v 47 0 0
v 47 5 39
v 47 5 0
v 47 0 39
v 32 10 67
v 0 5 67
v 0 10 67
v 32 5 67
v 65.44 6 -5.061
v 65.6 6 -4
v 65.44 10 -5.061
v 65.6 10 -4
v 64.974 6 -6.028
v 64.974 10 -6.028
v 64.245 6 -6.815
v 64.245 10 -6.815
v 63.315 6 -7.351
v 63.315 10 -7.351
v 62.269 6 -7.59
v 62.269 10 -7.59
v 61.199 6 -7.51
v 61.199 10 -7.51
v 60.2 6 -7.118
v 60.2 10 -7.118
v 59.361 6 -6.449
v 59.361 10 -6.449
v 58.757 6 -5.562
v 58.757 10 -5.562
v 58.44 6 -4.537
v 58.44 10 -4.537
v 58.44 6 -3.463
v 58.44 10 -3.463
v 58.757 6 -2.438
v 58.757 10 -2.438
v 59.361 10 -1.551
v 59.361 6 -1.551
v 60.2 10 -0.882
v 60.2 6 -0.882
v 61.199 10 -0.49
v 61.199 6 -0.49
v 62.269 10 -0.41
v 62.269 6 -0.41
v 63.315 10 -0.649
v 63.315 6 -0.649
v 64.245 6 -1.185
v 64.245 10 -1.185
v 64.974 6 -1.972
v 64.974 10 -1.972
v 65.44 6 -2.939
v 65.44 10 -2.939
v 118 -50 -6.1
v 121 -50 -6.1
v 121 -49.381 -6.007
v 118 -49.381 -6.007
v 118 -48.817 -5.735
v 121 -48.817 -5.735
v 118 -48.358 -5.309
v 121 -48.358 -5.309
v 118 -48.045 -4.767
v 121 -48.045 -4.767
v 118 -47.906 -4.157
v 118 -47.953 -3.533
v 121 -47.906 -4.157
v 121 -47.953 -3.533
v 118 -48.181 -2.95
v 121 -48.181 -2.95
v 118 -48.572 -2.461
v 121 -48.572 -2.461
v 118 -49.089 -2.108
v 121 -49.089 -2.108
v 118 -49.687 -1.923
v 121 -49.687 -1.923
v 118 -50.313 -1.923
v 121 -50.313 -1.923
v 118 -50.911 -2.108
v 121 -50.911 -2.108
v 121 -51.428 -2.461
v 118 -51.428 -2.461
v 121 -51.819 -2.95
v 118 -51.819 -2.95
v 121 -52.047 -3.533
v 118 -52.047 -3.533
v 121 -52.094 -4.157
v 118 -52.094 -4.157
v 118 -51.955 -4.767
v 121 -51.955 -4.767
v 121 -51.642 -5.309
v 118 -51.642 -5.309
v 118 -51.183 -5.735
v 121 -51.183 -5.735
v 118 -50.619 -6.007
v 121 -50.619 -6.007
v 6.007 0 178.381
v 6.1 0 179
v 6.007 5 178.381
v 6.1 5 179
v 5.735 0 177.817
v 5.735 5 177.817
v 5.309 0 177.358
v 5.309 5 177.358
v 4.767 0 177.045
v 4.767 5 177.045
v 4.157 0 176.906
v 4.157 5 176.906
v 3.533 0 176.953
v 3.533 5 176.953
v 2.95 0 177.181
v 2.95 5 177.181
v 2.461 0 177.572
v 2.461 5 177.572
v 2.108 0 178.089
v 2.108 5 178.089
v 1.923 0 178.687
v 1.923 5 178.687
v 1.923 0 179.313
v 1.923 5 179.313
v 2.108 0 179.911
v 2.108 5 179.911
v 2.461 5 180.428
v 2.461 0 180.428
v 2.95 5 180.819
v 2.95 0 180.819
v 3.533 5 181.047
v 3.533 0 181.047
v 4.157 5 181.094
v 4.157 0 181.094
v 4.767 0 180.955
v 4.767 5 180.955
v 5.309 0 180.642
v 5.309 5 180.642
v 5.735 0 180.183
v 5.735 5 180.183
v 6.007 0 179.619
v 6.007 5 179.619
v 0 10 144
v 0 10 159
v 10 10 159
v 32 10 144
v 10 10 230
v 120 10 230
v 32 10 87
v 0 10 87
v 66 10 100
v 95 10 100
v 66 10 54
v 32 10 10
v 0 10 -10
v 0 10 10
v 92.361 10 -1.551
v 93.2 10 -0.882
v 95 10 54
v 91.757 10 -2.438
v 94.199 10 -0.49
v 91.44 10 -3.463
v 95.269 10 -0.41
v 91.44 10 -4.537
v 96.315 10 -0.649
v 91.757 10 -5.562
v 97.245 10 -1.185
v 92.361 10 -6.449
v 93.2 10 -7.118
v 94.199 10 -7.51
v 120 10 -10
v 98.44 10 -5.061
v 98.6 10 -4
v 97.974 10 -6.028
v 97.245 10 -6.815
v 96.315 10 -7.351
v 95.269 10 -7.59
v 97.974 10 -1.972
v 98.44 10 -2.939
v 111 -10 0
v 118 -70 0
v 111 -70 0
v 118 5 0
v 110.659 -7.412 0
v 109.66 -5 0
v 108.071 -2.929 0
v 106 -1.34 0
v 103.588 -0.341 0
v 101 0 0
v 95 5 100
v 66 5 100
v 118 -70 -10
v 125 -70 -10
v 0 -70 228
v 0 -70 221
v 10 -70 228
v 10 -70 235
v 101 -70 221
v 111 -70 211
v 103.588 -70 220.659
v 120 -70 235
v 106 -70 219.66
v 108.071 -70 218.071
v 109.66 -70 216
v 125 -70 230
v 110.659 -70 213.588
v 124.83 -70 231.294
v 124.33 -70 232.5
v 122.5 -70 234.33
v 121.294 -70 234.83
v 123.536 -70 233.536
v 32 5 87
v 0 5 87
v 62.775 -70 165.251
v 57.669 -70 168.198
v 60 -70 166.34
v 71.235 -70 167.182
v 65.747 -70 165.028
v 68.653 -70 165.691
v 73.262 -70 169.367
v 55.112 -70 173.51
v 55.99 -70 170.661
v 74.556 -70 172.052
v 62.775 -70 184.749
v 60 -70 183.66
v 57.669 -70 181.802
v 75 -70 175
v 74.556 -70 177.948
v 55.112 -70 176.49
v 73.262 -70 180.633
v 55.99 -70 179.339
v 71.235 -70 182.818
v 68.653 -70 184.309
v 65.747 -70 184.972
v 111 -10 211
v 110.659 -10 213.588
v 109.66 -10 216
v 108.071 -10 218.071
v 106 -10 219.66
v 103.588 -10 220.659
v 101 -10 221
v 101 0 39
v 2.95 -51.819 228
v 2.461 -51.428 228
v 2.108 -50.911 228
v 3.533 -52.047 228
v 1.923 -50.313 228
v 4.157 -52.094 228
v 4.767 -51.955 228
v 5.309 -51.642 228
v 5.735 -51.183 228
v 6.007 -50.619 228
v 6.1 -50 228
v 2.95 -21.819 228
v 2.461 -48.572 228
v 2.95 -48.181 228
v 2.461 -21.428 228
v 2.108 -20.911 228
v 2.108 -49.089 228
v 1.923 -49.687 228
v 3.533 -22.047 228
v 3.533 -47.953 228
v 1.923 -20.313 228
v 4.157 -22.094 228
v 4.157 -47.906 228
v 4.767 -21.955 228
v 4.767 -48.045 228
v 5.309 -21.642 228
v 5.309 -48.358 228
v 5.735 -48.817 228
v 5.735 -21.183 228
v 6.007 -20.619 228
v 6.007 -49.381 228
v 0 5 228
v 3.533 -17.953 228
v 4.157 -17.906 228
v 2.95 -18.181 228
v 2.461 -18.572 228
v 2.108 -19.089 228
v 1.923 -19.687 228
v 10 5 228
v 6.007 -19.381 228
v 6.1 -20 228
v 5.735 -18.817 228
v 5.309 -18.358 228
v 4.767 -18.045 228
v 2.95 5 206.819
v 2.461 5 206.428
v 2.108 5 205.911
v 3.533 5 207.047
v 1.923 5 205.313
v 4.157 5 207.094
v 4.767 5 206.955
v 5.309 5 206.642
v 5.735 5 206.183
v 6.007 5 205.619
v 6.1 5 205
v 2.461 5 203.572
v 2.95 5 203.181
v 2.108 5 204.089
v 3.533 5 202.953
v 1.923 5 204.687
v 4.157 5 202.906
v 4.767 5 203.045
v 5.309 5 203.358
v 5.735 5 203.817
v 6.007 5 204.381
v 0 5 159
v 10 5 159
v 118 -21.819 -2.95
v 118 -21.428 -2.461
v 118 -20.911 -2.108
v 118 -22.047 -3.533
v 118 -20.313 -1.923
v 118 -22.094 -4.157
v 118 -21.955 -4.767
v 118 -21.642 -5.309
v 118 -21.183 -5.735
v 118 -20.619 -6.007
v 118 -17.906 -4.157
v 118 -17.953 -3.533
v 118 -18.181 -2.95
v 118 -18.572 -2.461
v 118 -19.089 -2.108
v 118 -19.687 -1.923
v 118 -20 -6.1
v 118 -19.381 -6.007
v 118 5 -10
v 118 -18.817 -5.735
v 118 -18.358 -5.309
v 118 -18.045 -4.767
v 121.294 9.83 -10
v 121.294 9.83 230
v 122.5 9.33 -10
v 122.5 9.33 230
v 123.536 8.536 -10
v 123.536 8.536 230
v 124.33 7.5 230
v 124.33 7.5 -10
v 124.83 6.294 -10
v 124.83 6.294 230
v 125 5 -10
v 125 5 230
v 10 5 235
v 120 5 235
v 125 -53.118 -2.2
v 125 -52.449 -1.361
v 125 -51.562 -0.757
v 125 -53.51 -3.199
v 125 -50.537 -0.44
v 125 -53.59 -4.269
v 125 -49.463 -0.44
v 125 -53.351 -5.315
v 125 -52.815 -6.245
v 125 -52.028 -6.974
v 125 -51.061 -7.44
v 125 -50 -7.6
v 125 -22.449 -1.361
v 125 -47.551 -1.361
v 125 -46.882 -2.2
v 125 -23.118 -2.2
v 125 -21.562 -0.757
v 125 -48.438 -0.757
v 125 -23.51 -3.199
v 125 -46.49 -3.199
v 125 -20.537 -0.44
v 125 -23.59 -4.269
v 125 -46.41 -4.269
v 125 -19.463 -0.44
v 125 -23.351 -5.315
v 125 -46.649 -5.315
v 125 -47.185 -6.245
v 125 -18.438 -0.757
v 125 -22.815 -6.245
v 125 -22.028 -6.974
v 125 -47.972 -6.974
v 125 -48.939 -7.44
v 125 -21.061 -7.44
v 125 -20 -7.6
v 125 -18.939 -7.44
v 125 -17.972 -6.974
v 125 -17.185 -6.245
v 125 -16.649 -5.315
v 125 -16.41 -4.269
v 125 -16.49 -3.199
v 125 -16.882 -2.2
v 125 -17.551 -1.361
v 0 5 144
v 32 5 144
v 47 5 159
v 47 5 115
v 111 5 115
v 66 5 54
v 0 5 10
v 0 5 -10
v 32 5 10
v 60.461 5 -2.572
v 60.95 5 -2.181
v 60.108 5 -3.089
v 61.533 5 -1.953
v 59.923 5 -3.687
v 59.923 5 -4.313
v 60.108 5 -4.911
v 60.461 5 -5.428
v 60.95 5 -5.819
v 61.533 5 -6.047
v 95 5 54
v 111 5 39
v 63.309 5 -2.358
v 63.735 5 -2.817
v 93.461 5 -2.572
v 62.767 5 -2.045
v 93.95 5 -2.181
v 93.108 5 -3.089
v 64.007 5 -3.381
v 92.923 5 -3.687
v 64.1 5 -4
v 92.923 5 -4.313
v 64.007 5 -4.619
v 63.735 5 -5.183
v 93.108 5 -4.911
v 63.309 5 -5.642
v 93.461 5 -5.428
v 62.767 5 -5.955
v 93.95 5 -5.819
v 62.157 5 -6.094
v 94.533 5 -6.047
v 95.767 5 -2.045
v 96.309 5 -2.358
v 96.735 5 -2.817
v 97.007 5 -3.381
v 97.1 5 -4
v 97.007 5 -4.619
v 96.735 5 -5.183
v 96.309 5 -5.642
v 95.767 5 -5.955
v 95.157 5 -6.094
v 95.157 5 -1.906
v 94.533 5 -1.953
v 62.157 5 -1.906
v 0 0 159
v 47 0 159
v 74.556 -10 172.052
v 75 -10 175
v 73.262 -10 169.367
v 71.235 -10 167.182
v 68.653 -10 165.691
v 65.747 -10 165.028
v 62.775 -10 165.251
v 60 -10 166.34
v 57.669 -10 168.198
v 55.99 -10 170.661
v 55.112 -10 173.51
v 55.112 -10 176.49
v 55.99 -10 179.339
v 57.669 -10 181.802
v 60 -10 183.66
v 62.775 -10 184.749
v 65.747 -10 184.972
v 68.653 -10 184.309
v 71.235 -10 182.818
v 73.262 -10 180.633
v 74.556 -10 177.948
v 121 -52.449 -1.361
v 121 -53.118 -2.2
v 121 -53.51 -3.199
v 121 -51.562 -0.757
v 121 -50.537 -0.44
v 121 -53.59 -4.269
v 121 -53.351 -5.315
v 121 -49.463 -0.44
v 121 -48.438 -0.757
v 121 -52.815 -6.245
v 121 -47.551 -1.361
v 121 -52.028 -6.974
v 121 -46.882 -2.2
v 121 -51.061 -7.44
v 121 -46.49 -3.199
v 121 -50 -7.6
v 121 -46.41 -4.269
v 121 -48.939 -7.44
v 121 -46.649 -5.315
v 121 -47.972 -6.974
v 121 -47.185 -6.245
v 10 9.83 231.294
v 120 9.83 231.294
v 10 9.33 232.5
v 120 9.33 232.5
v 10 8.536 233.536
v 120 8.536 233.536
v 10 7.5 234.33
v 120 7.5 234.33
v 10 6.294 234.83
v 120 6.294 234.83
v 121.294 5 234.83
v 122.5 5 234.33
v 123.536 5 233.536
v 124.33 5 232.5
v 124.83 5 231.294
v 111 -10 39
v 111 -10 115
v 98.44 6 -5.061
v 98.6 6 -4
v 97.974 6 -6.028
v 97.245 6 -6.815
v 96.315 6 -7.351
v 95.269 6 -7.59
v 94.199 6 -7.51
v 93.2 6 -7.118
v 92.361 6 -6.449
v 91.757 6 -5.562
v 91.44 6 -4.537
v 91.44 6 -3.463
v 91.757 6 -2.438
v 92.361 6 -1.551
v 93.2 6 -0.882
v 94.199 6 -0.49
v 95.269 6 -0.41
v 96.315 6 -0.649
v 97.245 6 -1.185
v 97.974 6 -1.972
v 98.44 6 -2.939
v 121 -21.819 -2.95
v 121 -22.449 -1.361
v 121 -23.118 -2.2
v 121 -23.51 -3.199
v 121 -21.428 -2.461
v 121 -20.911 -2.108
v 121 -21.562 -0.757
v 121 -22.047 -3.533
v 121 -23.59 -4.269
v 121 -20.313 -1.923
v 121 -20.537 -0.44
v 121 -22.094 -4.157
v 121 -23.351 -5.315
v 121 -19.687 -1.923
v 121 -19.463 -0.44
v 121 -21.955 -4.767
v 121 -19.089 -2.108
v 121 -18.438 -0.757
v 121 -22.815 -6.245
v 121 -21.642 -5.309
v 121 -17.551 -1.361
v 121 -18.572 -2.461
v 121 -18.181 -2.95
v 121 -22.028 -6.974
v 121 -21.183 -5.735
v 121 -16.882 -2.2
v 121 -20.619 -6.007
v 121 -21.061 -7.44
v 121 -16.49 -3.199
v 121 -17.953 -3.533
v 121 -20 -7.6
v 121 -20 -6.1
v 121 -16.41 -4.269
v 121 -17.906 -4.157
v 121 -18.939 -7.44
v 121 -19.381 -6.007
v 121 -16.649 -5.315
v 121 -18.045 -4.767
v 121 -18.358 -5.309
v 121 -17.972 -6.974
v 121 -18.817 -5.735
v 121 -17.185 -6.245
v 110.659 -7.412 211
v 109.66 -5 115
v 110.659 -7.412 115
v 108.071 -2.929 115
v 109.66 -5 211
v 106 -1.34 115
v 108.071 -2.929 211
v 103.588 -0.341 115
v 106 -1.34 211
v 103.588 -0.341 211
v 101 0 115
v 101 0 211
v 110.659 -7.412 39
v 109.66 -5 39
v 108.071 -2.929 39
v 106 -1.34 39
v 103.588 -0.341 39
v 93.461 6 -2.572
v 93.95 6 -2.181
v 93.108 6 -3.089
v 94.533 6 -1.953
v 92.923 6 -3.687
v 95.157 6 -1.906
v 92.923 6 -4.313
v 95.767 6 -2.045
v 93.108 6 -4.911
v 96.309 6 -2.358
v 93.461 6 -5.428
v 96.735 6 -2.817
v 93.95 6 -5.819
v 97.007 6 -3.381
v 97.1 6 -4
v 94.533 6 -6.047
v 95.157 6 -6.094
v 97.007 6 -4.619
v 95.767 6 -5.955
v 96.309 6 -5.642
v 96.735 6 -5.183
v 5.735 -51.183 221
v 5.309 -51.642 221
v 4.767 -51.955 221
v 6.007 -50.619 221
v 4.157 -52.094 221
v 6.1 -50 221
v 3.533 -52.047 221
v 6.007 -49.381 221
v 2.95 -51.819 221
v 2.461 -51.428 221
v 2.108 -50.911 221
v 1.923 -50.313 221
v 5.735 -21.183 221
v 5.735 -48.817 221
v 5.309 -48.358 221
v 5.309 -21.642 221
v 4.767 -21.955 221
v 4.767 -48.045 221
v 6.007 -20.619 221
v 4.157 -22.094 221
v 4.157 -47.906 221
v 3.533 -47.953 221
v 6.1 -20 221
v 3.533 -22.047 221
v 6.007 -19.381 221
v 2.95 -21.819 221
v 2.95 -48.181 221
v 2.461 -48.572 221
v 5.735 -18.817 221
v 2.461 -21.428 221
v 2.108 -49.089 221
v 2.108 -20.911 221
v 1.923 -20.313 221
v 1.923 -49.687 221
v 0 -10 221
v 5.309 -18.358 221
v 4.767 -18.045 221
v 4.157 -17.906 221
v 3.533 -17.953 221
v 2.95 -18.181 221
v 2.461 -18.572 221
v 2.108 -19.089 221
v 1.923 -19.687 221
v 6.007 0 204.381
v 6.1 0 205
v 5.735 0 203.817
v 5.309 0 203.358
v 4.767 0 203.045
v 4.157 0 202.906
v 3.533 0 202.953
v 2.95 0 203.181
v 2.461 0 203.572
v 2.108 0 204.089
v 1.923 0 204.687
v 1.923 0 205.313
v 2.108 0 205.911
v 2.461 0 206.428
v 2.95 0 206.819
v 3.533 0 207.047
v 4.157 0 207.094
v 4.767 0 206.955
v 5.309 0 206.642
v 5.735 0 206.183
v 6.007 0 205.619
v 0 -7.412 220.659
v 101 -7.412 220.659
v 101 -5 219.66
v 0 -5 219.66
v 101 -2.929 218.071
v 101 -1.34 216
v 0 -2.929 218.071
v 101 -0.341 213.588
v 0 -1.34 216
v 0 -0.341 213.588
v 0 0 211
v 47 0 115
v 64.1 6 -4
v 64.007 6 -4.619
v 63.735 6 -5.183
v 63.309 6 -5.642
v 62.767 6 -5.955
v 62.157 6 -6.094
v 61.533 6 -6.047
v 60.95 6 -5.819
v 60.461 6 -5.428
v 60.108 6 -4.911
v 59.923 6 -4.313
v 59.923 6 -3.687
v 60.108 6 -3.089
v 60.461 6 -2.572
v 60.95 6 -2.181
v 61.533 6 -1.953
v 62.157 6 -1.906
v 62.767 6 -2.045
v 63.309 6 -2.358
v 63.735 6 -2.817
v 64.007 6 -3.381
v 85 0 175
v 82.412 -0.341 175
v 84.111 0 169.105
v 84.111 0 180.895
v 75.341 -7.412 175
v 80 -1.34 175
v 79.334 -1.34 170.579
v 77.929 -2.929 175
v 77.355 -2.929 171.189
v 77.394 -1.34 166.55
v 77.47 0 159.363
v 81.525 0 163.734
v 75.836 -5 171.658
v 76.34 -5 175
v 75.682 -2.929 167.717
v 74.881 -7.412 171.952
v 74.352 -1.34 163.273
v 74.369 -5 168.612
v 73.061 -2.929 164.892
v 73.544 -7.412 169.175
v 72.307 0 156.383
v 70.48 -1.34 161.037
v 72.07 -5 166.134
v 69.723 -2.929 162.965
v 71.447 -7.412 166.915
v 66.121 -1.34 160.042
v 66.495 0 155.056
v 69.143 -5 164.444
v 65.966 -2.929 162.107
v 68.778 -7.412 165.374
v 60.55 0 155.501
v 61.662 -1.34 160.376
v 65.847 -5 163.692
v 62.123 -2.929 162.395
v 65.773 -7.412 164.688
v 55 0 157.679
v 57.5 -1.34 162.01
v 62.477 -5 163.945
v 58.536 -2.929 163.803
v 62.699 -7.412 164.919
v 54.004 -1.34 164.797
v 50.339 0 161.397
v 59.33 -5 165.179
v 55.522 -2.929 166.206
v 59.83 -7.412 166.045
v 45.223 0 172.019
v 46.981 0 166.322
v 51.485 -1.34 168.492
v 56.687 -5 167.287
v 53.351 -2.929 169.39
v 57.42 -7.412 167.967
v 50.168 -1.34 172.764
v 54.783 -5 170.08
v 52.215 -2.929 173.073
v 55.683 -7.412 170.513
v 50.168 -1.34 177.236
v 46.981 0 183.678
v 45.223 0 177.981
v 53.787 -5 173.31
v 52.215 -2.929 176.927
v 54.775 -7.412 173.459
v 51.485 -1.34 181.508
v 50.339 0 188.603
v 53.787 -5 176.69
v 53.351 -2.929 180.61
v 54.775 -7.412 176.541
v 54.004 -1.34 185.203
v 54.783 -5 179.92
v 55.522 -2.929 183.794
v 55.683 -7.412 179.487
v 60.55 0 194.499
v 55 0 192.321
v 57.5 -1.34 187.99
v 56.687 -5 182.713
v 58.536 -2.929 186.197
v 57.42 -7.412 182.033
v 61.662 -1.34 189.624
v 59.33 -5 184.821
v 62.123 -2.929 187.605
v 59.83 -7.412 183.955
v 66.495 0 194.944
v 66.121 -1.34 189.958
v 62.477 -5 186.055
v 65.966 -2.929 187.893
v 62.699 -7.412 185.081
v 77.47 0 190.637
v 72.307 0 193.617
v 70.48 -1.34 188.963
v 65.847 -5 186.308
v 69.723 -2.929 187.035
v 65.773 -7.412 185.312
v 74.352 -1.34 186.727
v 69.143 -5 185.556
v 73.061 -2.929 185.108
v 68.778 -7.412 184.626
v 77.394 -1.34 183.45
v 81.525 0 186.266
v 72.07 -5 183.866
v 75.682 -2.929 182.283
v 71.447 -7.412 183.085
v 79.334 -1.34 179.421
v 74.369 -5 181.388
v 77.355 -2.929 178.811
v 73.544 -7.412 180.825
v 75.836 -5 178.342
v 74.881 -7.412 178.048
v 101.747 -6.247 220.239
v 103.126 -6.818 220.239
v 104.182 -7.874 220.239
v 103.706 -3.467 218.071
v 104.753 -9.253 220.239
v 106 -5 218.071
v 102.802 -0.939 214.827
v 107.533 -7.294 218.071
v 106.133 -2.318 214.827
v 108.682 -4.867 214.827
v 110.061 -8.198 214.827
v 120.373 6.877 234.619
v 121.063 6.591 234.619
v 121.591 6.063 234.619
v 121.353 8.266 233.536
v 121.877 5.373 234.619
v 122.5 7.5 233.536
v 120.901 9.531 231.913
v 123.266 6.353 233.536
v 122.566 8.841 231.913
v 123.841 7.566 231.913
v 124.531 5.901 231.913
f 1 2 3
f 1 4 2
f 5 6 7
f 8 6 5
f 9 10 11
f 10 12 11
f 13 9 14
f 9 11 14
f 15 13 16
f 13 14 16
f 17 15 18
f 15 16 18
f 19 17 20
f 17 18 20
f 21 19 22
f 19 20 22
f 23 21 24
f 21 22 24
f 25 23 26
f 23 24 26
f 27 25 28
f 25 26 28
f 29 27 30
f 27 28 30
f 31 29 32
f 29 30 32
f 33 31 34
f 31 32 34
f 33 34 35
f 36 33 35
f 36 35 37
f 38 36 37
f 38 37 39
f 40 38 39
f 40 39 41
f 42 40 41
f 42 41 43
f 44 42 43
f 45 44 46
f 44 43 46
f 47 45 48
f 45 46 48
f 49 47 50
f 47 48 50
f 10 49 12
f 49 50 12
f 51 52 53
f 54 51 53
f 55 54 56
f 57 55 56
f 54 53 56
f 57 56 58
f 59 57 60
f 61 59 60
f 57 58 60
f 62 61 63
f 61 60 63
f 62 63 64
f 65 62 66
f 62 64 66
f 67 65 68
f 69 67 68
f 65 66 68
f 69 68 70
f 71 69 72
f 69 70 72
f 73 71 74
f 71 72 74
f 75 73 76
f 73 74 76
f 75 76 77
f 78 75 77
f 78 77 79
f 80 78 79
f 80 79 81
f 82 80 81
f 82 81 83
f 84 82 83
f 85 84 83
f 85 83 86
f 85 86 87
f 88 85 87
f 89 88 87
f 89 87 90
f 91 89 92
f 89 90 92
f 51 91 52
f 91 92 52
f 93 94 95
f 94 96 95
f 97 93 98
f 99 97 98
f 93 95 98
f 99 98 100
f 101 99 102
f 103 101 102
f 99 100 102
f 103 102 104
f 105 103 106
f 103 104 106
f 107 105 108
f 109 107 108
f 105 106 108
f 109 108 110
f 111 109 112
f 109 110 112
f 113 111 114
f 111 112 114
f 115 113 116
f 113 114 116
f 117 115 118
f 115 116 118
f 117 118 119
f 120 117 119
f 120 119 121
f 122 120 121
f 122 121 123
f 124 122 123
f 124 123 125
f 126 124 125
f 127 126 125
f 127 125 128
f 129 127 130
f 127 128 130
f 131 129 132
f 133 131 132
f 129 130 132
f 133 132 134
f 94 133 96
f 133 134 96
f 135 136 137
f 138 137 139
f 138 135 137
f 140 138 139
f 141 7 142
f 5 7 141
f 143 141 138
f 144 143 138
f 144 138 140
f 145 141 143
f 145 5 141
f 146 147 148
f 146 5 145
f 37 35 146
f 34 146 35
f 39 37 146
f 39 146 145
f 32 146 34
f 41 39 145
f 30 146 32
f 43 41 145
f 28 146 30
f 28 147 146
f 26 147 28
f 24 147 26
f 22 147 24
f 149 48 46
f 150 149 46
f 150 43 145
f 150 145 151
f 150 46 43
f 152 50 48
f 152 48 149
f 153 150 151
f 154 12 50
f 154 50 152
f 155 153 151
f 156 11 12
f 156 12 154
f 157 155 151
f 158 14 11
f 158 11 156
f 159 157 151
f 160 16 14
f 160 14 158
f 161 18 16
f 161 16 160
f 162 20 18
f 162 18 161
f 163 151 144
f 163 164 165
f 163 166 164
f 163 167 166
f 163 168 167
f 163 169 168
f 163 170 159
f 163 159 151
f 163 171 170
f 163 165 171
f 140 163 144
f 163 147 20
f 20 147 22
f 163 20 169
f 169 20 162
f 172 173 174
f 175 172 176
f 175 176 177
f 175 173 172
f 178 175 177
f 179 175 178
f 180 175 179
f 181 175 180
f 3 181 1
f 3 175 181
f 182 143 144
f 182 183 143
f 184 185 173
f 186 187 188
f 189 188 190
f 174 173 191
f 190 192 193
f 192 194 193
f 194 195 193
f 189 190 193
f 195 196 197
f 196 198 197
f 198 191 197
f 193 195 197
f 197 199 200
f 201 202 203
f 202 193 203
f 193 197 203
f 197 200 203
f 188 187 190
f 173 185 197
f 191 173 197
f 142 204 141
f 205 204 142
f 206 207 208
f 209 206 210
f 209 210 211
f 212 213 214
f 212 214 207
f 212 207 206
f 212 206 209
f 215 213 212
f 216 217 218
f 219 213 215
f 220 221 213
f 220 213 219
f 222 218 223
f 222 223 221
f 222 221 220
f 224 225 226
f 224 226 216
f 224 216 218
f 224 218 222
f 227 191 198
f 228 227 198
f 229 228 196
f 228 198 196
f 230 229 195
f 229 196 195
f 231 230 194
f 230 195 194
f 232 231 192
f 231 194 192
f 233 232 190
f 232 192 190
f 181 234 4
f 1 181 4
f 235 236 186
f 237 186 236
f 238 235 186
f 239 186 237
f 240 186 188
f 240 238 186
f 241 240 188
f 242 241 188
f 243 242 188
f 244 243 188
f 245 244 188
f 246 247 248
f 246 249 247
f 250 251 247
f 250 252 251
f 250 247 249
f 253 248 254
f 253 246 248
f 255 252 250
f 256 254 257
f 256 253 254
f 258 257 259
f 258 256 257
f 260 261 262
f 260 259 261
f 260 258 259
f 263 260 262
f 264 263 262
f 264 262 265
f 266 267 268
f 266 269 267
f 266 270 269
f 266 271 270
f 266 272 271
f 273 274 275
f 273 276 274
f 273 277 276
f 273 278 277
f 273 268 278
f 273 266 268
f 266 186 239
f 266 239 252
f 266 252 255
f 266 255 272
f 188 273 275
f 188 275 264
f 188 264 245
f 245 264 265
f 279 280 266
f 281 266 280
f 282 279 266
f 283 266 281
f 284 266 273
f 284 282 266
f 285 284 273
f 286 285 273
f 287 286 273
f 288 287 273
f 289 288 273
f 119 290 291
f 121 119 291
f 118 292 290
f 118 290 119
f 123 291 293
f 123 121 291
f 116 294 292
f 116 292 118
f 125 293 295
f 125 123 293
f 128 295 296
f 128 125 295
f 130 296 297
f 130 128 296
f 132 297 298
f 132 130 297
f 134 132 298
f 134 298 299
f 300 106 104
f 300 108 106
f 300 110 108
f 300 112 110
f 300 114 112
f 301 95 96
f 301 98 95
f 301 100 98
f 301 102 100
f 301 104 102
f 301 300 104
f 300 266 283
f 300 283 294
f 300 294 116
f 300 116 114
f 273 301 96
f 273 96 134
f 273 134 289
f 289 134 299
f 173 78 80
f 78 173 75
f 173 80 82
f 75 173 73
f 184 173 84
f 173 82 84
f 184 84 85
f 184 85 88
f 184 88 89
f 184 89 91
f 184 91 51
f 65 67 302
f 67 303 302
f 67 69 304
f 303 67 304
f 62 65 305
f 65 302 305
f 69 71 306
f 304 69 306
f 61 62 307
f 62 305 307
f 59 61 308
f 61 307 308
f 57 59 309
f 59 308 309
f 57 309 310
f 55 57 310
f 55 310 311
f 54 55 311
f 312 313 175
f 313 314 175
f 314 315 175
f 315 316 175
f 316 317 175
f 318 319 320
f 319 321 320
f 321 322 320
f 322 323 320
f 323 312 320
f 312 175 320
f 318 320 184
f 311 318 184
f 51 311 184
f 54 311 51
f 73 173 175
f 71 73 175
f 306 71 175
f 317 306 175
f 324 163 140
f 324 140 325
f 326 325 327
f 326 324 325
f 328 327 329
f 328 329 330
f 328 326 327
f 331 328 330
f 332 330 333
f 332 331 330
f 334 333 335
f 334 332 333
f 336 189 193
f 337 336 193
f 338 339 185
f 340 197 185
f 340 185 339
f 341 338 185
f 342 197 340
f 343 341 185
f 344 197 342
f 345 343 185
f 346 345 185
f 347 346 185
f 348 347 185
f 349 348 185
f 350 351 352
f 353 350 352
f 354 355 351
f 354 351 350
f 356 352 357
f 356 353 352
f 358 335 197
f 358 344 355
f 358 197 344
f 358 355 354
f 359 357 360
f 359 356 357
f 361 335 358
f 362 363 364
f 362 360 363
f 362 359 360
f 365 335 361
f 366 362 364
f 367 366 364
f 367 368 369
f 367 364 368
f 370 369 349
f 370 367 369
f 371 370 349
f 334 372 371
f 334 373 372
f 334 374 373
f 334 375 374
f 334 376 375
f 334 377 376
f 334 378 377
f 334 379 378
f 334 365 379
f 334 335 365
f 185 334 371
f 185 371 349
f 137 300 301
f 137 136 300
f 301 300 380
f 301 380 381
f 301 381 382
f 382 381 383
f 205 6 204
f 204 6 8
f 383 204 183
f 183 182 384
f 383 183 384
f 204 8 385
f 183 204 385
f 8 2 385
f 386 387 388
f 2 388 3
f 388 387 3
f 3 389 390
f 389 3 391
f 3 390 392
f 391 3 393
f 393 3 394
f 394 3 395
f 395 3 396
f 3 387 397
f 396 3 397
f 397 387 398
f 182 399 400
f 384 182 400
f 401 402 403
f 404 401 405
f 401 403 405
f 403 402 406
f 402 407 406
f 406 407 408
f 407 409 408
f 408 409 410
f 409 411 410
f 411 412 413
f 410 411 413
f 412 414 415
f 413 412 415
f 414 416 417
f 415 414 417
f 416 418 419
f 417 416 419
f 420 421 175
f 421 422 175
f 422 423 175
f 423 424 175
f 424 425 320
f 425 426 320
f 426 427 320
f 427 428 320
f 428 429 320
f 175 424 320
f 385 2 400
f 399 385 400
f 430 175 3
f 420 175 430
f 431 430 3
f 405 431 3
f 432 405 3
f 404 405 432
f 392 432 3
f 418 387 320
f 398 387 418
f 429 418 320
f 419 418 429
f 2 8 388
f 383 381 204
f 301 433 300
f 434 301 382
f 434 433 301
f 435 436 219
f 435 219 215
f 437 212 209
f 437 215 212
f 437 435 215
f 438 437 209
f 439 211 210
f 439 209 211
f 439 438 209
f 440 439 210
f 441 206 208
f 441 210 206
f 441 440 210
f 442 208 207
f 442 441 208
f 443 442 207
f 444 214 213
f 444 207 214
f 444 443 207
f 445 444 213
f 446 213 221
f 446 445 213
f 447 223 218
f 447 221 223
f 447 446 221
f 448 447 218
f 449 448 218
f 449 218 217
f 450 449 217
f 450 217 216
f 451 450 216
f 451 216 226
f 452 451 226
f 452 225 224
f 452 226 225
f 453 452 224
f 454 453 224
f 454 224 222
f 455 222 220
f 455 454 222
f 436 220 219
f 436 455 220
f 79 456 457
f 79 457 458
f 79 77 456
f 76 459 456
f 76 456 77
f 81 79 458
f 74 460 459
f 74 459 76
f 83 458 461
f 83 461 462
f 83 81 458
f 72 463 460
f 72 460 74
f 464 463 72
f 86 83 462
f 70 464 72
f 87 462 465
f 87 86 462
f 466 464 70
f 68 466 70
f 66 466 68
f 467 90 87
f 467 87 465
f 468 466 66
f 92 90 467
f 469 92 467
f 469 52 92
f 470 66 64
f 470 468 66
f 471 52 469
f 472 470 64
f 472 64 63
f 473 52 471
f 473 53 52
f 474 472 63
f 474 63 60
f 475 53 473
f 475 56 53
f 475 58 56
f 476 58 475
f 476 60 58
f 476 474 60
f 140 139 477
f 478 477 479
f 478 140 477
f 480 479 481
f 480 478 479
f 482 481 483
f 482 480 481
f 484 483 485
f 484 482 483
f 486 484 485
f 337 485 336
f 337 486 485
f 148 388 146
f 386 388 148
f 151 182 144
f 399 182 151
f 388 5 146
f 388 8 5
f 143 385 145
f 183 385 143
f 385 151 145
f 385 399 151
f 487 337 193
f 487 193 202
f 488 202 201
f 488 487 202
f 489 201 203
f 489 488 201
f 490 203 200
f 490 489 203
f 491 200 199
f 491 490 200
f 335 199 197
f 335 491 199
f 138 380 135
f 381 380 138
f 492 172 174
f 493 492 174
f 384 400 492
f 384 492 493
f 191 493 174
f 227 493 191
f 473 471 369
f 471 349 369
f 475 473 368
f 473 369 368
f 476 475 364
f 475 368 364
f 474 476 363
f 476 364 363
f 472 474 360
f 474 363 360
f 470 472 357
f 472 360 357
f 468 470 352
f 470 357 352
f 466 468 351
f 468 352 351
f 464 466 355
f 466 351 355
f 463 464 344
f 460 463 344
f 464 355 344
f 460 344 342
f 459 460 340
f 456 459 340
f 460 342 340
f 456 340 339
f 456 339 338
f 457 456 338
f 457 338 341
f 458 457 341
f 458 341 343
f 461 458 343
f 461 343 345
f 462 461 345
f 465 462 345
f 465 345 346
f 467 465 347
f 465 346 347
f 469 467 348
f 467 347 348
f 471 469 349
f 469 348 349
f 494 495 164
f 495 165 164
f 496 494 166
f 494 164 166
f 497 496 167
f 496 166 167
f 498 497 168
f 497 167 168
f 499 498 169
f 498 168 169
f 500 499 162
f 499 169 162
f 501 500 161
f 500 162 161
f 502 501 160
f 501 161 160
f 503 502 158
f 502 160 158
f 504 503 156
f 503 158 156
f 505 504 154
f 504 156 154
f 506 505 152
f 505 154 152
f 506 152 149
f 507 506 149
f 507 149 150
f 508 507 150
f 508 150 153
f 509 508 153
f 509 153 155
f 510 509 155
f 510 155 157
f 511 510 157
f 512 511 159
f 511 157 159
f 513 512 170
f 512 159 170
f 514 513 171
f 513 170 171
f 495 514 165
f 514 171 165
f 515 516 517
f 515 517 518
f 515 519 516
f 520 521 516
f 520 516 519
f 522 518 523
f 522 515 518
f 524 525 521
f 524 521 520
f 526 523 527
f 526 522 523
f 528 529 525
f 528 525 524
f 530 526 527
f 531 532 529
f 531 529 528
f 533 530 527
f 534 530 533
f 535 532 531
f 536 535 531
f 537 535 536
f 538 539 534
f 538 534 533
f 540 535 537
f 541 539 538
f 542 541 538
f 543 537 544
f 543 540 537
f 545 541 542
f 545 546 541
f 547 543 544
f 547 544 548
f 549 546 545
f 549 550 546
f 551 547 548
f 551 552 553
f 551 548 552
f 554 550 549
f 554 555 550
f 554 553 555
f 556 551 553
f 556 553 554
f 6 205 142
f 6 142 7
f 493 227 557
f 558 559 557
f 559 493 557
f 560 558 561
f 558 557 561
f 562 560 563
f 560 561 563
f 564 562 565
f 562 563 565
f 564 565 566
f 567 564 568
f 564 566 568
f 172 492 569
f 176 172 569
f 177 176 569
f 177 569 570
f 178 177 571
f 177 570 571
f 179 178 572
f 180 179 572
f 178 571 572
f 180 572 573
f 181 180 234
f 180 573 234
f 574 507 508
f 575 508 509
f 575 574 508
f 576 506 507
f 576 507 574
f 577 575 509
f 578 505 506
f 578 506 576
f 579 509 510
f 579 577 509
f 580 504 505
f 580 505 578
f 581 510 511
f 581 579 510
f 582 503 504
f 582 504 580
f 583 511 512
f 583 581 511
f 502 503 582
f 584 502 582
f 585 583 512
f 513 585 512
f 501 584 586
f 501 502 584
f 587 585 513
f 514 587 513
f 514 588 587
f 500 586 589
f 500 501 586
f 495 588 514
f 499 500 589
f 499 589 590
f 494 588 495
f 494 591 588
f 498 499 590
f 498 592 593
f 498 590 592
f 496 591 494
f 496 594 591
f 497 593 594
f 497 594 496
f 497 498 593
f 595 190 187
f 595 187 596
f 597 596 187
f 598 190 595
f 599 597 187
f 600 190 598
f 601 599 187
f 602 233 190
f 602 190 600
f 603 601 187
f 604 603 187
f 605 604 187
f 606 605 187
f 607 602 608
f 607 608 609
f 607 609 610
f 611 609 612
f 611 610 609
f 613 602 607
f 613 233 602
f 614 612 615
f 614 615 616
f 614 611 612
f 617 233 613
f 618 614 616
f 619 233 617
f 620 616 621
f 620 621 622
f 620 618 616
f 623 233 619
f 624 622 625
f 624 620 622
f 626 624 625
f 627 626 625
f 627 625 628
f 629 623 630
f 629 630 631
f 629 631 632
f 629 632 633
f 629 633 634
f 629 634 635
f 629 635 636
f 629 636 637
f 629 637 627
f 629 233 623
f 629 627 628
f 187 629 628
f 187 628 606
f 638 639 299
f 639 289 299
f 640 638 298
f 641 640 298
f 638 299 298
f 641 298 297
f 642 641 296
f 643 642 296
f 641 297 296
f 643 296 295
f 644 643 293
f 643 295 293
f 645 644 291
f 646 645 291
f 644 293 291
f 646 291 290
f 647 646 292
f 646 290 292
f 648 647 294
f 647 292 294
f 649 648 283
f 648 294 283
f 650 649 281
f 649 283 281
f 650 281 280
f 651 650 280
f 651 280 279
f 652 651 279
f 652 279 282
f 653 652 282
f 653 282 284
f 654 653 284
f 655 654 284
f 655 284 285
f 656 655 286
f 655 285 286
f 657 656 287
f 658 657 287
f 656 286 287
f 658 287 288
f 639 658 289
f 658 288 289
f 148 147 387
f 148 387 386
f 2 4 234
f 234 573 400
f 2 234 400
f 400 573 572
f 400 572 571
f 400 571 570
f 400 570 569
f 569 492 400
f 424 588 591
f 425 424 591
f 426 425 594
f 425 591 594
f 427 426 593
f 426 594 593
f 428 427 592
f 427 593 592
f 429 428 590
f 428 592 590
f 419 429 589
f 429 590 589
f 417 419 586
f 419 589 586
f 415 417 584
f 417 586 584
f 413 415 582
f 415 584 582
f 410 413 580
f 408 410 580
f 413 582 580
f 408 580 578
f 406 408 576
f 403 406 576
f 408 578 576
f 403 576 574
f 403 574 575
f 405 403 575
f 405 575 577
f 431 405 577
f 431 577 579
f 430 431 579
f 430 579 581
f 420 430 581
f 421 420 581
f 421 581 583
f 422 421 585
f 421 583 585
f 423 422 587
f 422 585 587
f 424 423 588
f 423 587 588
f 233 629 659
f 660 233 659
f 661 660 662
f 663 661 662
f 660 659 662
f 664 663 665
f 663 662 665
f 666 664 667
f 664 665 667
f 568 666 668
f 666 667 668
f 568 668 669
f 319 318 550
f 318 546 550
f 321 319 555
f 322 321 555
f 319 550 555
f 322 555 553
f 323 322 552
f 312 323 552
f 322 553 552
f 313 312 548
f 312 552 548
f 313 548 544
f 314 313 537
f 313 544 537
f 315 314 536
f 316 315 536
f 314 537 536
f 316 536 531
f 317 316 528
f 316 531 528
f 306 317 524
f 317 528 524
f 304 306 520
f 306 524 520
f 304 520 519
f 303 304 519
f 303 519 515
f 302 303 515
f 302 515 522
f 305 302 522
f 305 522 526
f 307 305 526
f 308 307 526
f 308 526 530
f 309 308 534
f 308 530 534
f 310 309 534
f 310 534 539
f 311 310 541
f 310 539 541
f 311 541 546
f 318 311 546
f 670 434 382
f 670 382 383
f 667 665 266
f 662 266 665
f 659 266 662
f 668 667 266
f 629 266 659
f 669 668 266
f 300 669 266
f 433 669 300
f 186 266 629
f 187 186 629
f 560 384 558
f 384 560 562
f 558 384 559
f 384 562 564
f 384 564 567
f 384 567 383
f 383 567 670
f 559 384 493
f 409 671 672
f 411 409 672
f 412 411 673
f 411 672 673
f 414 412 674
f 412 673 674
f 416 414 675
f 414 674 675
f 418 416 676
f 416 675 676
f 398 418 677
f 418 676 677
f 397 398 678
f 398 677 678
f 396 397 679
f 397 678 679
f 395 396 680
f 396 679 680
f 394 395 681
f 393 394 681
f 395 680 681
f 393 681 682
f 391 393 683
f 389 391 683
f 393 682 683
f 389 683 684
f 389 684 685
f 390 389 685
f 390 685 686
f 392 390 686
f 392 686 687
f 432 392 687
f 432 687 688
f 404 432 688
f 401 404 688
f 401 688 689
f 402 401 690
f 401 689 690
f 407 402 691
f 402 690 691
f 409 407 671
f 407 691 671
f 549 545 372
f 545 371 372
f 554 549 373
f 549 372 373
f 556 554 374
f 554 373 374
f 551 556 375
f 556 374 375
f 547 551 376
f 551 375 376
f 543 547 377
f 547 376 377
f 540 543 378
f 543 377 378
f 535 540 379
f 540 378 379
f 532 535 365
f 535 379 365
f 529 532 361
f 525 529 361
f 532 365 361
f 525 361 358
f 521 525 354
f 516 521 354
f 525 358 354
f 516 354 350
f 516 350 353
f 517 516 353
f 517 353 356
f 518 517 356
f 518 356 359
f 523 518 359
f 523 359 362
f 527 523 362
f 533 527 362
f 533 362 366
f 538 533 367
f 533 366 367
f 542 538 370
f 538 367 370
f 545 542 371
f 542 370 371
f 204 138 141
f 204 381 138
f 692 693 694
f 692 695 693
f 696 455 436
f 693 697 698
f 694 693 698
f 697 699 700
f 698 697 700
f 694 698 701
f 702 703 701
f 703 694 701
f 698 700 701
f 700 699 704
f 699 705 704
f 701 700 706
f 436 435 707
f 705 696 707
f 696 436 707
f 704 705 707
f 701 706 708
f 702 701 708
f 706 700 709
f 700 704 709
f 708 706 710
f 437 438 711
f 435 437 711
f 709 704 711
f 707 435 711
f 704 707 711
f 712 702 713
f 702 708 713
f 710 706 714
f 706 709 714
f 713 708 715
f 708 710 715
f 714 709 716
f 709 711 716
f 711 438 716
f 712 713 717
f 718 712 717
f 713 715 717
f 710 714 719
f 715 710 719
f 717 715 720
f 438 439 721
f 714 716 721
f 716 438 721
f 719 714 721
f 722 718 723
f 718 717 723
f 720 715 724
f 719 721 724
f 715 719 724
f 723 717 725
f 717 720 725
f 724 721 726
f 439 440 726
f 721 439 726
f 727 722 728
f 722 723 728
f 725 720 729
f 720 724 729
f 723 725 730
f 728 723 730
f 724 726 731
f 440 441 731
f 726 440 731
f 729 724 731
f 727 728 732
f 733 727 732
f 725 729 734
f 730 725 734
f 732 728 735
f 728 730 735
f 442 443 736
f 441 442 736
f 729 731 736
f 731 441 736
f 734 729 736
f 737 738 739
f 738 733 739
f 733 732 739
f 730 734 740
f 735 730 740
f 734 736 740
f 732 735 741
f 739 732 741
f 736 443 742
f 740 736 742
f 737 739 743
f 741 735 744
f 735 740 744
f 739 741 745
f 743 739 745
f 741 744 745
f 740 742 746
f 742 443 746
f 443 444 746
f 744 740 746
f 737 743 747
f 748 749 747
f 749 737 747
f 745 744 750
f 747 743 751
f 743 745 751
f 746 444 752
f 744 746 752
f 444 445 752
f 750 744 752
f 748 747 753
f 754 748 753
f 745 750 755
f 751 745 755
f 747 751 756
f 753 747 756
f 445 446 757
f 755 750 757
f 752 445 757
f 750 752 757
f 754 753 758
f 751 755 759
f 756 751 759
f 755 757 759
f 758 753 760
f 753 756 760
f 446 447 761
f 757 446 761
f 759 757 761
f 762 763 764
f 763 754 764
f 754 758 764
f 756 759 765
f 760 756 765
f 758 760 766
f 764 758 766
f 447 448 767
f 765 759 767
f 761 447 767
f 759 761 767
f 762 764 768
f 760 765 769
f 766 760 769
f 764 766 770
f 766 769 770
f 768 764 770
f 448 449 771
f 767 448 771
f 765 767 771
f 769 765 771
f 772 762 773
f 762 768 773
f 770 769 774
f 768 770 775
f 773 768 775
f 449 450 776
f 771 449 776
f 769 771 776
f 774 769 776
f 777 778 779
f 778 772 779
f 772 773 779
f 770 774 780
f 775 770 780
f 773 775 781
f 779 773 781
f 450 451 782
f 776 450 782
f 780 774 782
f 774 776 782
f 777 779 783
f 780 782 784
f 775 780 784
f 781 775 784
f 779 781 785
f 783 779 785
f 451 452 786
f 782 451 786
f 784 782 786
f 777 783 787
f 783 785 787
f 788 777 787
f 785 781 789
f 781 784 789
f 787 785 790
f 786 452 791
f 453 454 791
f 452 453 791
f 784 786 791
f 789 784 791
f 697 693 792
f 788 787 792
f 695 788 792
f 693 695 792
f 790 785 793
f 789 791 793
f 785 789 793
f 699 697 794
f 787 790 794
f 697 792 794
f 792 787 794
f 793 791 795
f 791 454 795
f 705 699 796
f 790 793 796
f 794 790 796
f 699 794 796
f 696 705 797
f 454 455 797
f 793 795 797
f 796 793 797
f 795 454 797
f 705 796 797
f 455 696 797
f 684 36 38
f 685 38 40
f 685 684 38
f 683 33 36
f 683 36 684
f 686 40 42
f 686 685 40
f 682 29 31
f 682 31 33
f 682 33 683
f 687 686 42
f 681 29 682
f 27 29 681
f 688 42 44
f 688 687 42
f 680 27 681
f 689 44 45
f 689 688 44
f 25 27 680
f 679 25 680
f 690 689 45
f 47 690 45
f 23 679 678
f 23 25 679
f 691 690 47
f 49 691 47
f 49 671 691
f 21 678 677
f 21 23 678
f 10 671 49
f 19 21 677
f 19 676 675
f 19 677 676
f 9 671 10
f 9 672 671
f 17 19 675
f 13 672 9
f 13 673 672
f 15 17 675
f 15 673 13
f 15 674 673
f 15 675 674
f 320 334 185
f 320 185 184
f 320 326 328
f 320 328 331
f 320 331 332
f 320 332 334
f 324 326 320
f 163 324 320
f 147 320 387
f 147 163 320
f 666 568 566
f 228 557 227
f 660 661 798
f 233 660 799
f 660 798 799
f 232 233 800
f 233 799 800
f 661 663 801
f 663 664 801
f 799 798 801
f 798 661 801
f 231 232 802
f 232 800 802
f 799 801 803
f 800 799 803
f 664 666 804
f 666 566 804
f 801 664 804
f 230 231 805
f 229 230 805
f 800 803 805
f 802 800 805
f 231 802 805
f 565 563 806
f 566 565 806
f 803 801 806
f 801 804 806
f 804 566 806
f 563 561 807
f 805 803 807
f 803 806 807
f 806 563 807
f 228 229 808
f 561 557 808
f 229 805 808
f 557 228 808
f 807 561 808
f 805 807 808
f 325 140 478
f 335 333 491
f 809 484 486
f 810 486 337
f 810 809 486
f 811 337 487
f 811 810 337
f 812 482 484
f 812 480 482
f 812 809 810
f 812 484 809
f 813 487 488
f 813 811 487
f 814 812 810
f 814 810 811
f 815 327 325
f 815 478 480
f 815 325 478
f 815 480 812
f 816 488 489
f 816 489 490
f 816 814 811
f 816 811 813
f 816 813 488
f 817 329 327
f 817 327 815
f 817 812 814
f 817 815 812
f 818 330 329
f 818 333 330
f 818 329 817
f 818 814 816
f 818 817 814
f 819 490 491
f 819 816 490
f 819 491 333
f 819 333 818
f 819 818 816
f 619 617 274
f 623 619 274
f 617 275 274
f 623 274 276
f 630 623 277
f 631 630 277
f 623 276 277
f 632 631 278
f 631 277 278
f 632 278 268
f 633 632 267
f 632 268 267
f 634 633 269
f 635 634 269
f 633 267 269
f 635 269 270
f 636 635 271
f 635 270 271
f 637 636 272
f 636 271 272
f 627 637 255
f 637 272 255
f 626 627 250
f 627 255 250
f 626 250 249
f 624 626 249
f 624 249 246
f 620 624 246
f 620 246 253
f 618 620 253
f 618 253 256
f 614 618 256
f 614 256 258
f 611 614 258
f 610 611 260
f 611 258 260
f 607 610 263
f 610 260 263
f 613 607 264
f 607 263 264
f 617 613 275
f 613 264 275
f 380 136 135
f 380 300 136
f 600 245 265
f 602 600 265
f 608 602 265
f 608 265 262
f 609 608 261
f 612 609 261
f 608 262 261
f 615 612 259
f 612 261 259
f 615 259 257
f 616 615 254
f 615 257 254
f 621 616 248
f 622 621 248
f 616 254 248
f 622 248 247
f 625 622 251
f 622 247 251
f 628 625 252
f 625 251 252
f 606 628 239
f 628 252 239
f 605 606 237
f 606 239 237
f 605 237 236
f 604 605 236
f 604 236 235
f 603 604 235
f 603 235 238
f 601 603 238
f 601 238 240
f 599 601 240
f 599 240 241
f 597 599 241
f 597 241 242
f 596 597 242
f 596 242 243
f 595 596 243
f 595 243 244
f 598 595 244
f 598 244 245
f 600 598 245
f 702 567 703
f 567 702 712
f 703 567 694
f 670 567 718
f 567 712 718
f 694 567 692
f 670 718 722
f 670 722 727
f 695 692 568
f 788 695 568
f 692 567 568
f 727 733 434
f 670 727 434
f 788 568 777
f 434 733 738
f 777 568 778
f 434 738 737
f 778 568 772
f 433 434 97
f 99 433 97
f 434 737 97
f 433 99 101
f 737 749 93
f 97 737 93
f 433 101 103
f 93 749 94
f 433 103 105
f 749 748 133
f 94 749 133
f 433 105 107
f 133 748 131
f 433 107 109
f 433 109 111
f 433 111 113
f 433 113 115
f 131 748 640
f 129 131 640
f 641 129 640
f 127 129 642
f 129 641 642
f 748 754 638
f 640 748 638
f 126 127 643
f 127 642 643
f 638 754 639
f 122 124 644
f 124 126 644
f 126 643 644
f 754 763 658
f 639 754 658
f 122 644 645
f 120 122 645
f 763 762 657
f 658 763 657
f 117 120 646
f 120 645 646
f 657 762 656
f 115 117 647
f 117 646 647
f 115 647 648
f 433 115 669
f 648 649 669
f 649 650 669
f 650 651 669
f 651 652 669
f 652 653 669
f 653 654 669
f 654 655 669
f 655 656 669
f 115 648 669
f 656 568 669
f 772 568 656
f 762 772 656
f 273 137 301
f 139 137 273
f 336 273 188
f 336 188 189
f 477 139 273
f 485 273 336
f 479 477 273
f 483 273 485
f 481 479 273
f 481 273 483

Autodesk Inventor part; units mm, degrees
ref_plane "YZ Plane" through (0, 0, 0) normal (1, 0, 0) x (0, 1, 0)
ref_plane "XZ Plane" through (0, 0, 0) normal (0, 1, 0) x (-1, 0, 0)
ref_plane "XY Plane" through (0, 0, 0) normal (0, 0, 1) x (1, 0, 0)
sketch "草图5" plane through (0, 0, 0) normal (0, 1, 0) x (-1, 0, 0)
  line L0 (125, 235) -> (-125, 235)
  line L1 (-125, 235) -> (-125, -235)
  line L2 (-125, -235) -> (125, -235)
  line L3 (125, -235) -> (125, 235)
  line L4 (0, 3) -> (0, -5)
  line L5 (3.5058, 0) -> (-3.4421, 0)
  line L6 (25, 144) -> (-32, 144)
  line L7 (-32, 144) -> (-32, 87)
  line L8 (-32, 87) -> (25, 87)
  line L9 (25, 87) -> (25, 144)
  line L10 (25, 67) -> (-32, 67)
  line L11 (-32, 67) -> (-32, 10)
  line L12 (-32, 10) -> (25, 10)
  line L13 (25, 10) -> (25, 67)
  line L14 (25, -10) -> (-32, -10)
  line L15 (-32, -10) -> (-32, -67)
  line L16 (-32, -67) -> (25, -67)
  line L17 (25, -67) -> (25, -10)
  line L18 (25, -87) -> (-32, -87)
  line L19 (-32, -87) -> (-32, -144)
  line L20 (-32, -144) -> (25, -144)
  line L21 (25, -144) -> (25, -87)
  line L22 (-66, 100) -> (-95, 100)
  line L23 (-95, 100) -> (-95, 54)
  line L24 (-95, 54) -> (-66, 54)
  line L25 (-66, 54) -> (-66, 100)
  line L26 (-66, -54) -> (-95, -54)
  line L27 (-95, -54) -> (-95, -100)
  line L28 (-95, -100) -> (-66, -100)
  line L29 (-66, -100) -> (-66, -54)
  line L30 (100, 15) -> (70, 15)
  line L31 (70, 15) -> (70, -15)
  line L32 (70, -15) -> (100, -15)
  line L33 (100, -15) -> (100, 15)
  circle A0 centre (65, 182) radius 10
  circle A1 centre (65, -182) radius 10
  circle A2 centre (65, 182) radius 15
  circle A3 centre (80, 182) radius 1.5
  circle A4 centre (57.5, 194.9904) radius 1.5
  circle A5 centre (57.5, 169.0096) radius 1.5
  line L34 (125, 235) -> (0, 235)
  line L35 (0, 235) -> (0, 0)
  line L36 (0, 0) -> (125, 0)
  line L37 (125, 0) -> (125, 235)
  line L38 (-125, 235) -> (0, 235)
  line L39 (0, 235) -> (0, 0)
  line L40 (0, 0) -> (-125, 0)
  line L41 (-125, 0) -> (-125, 235)
  line L42 (-125, -235) -> (0, -235)
  line L43 (0, -235) -> (0, 0)
  line L44 (0, 0) -> (-125, 0)
  line L45 (-125, 0) -> (-125, -235)
  line L46 (125, -235) -> (0, -235)
  line L47 (0, -235) -> (0, 0)
  line L48 (0, 0) -> (125, 0)
  line L49 (125, 0) -> (125, -235)
  circle A6 centre (65, -182) radius 15
  circle A7 centre (80, -182) radius 1.5
  circle A8 centre (57.5, -169.0096) radius 1.5
  circle A9 centre (57.5, -194.9904) radius 1.5
  point P0 (0, 67)
  point P1 (0, 87)
  point P2 (0, 144)
  point P3 (0, 10)
  dimension "d142" = 30
  dimension "d145" = 30
  dimension "d111" = 470
  dimension "d112" = 250
  dimension "d113" = 57
  dimension "d114" = 57
  dimension "d115" = 57
  dimension "d116" = 57
  dimension "d117" = 57
  dimension "d118" = 57
  dimension "d119" = 57
  dimension "d120" = 57
  dimension "d121" = 91
  dimension "d122" = 20
  dimension "d123" = 20
  dimension "d124" = 20
  dimension "d125" = 93
  dimension "d126" = 29
  dimension "d127" = 46
  dimension "d128" = 46
  dimension "d129" = 135
  dimension "d130" = 108
  dimension "d131" = 30
  dimension "d132" = 30
  dimension "d133" = 30
  dimension "d134" = 25
  dimension "d135" = 220
  dimension "d136" = 20
  dimension "d137" = 53
  dimension "d138" = 60
  dimension "d139" = 20
  dimension "d140" = 53
  dimension "d141" = 60
  dimension "d143" = 3
  dimension "d144" = 360
  dimension "d146" = 3
  dimension "d147" = 360
extrude "拉伸5" add sketch "草图5" along normal blind 10 contours L35 L6 L7 L8 L10 L11 L12 L4 L5 L40 L1 L0
sketch "草图6" plane through (0, 0, 0) normal (0, -1, 0) x (1, 0, 0)
  line L0 (125, 0) -> (0, 0) projected
  line L1 (0, 144) -> (0, 235) projected
  line L2 (47, 0) -> (0, 0)
  line L3 (0, 0) -> (0, 159)
  line L4 (0, 159) -> (47, 159)
  line L5 (47, 159) -> (47, 0)
  line L6 (32, 87) -> (32, 144) projected
  line L7 (32, 144) -> (0, 144) projected
  line L8 (111, 115) -> (47, 115)
  line L9 (47, 115) -> (47, 39)
  line L10 (47, 39) -> (111, 39)
  line L11 (111, 39) -> (111, 115)
  line L12 (95, 54) -> (95, 100) projected
  line L13 (95, 100) -> (66, 100) projected
  line L14 (66, 54) -> (95, 54) projected
  line L15 (66, 100) -> (66, 54) projected
  dimension "d150" = 15
  dimension "d151" = 15
  dimension "d152" = 16
  dimension "d153" = 15
  dimension "d154" = 15
  dimension "d155" = 19
extrude "拉伸6" cut sketch "草图6" against normal blind 5 contours L0 L3 L1 L4 L5 | L5 L8 L11 L10 | L14 L15 L13 L12
sketch "草图7" plane through (0, 10, 0) normal (0, 1, 0) x (1, 0, 0)
  line L0 (0, -144) -> (0, -159) projected
  line L1 (0, -235) -> (125, -235) projected
  line L2 (0, -159) -> (10, -159)
  line L3 (10, -159) -> (10, -235)
  line L4 (10, -235) -> (0, -235)
  line L5 (0, -235) -> (0, -159)
  point P0 (0, 0)
  dimension "d158" = 10
extrude "拉伸7" cut sketch "草图7" against normal blind 5
sketch "草图8" plane through (0, 5, 0) normal (0, 1, 0) x (1, 0, 0)
  circle A0 centre (4, -205) radius 2.1
  circle A1 centre (4, -179) radius 2.1
  line L0 (0, -235) -> (0, -159) projected
  line L1 (10, -235) -> (0, -235) projected
  line L2 (32, -144) -> (0, -144) projected
  line L3 (0, -159) -> (10, -159) projected
  point P0 (0, 0)
  dimension "d161" = 4.2
  dimension "d162" = 4.2
  dimension "d163" = 4
  dimension "d164" = 4
  dimension "d165" = 30
  dimension "d169" = 20
extrude "拉伸8" cut sketch "草图8" against normal blind 5
sketch "草图9" plane through (0, 0, 0) normal (0, -1, 0) x (1, 0, 0)
  line L0 (125, 0) -> (0, 0) projected
  line L1 (0, 235) -> (125, 235) projected
  line L2 (125, 0) -> (111, 0)
  line L3 (111, 0) -> (111, 235)
  line L4 (111, 235) -> (125, 235)
  line L5 (125, 235) -> (125, 0)
  line L6 (0, 159) -> (0, 235) projected
  line L7 (125, 235) -> (125, 0) projected
  line L8 (0, 235) -> (125, 235)
  line L9 (125, 235) -> (125, 221)
  line L10 (125, 221) -> (0, 221)
  line L11 (0, 221) -> (0, 235)
  point P0 (0, 221)
  point P1 (111, 221)
  dimension "d170" = 14
  dimension "d171" = 14
extrude "拉伸9" add sketch "草图9" along normal blind 70
sketch "草图10" plane through (10, 10, 235) normal (0, 0, 1) x (1, 0, 0)
  line L0 (0, -5) -> (-10, -5) projected
  line L1 (-10, -80) -> (-10, -5) projected
  line L2 (0, -5) -> (-10, -5)
  line L3 (-10, -5) -> (-10, -80)
  line L4 (-10, -80) -> (0, -80)
  line L5 (0, -80) -> (0, -5)
  point P0 (-10, -10)
extrude "拉伸10" cut sketch "草图10" against normal blind 7
sketch "草图11" plane through (10, 10, 228) normal (0, 0, 1) x (1, 0, 0)
  circle A0 centre (-6, -30) radius 2.1
  circle A1 centre (-6, -60) radius 2.1
  line L0 (-10, -80) -> (-10, -5) projected
  line L1 (0, -80) -> (-10, -80) projected
  line L2 (0, 0) -> (115, 0) projected
  point P0 (-10, -10)
  dimension "d176" = 4.2
  dimension "d177" = 4.2
  dimension "d178" = 4
  dimension "d179" = 4
  dimension "d180" = 20
  dimension "d181" = 30
extrude "拉伸11" cut sketch "草图11" against normal blind 7
fillet "圆角2" radius 10 4 edges at (111, 0, 168) (111, 0, 19.5) (111, -35, 221) (55.5, 0, 221)
sketch "草图12" plane through (0, 0, 0) normal (0, -1, 0) x (1, 0, 0)
  circle A0 centre (65, 175) radius 10
  line L0 (125, 0) -> (125, 235) projected
  line L1 (125, 235) -> (10, 235) projected
  point P0 (0, 0)
  point P1 (125, 230)
  point P2 (120, 235)
  dimension "d186" = 20
  dimension "d187" = 60
  dimension "d188" = 60
extrude "拉伸12" add sketch "草图12" along normal blind 70
fillet "圆角3" radius 10 1 edges at (55, 0, 175)
sketch "草图14" plane through (125, 10, 235) normal (1, 0, 0) x (0, 0, -1)
  line L0 (235, -80) -> (235, 0) projected
  line L1 (235, 0) -> (245, 0)
  line L2 (245, 0) -> (245, -80)
  line L3 (245, -80) -> (235, -80)
  line L4 (235, -80) -> (235, 0)
  line L5 (0, 0) -> (235, 0) projected
  circle A0 centre (239, -60) radius 2.1
  circle A1 centre (239, -30) radius 2.1
  point P0 (235, -10)
  dimension "d192" = 10
  dimension "d193" = 80
  dimension "d196" = 4.2
  dimension "d197" = 4.2
  dimension "d198" = 6
  dimension "d199" = 6
  dimension "d200" = 20
  dimension "d201" = 30
extrude "拉伸14" add sketch "草图14" against normal blind 7
sketch "草图15" plane through (0, 10, 0) normal (0, 1, 0) x (1, 0, 0)
  line L0 (118, 0) -> (0, 0)
  circle A0 centre (95, 4) radius 2.1
  circle A1 centre (62, 4) radius 2.1
  line L1 (125, -235) -> (125, 10) projected
  line L2 (118, 0) -> (32, 0)
  line L3 (32, 0) -> (32, 10)
  line L4 (32, 10) -> (118, 10)
  line L5 (118, 10) -> (118, 0)
  line L6 (32, -10) -> (32, -67) projected
  line L7 (125, 10) -> (118, 10) projected
  point P0 (32, 0)
  dimension "d205" = 4.2
  dimension "d206" = 4.2
  dimension "d209" = 30
  dimension "d212" = 6
  dimension "d213" = 6
  dimension "d214" = 30
extrude "拉伸15" add sketch "草图15" against normal blind 5
sketch "草图16" plane through (0, 10, 0) normal (0, 1, 0) x (1, 0, 0)
  circle A0 centre (95, 4) radius 2.1 projected
  circle A1 centre (95, 4) radius 3.6
  circle A2 centre (62, 4) radius 2.1 projected
  circle A3 centre (62, 4) radius 3.6
  point P0 (0, 0)
  dimension "d217" = 7.2
  dimension "d218" = 7.2
extrude "拉伸16" cut sketch "草图16" against normal blind 4
sketch "草图17" plane through (125, -70, 235) normal (1, 0, 0) x (0, 0, -1)
  circle A0 centre (239, 50) radius 2.1 projected
  circle A1 centre (239, 50) radius 3.6
  circle A2 centre (239, 20) radius 2.1 projected
  circle A3 centre (239, 20) radius 3.6
  point P0 (235, 70)
  dimension "d221" = 7.2
  dimension "d222" = 7.2
extrude "拉伸17" cut sketch "草图17" against normal blind 4
fillet "圆角4" radius 5 3 edges at (125, 10, 112.5) (67.5, 10, 235) (125, -30, 235)
sketch "草图18" plane through (0, 10, 0) normal (0, 1, 0) x (1, 0, 0)
  line L0 (0, 0) -> (0, -10) projected
  line L1 (32, 10) -> (118, 10) projected
  line L2 (0, 0) -> (32, 0)
  line L3 (32, 0) -> (32, 10)
  line L4 (32, 10) -> (0, 10)
  line L5 (0, 10) -> (0, 0)
extrude "拉伸18" add sketch "草图18" against normal blind 5
sketch "草图20" plane through (0, -70, 0) normal (0, -1, 0) x (1, 0, 0)
  circle A0 centre (65, 175) radius 10 projected
  circle A1 centre (65, 175) radius 10
  line L0 (111, 211) -> (111, 0) projected
  line L1 (0, 221) -> (101, 221) projected
  point P0 (0, 0)
  dimension "d228" = 46
  dimension "d229" = 46
properties part number "top_3"
